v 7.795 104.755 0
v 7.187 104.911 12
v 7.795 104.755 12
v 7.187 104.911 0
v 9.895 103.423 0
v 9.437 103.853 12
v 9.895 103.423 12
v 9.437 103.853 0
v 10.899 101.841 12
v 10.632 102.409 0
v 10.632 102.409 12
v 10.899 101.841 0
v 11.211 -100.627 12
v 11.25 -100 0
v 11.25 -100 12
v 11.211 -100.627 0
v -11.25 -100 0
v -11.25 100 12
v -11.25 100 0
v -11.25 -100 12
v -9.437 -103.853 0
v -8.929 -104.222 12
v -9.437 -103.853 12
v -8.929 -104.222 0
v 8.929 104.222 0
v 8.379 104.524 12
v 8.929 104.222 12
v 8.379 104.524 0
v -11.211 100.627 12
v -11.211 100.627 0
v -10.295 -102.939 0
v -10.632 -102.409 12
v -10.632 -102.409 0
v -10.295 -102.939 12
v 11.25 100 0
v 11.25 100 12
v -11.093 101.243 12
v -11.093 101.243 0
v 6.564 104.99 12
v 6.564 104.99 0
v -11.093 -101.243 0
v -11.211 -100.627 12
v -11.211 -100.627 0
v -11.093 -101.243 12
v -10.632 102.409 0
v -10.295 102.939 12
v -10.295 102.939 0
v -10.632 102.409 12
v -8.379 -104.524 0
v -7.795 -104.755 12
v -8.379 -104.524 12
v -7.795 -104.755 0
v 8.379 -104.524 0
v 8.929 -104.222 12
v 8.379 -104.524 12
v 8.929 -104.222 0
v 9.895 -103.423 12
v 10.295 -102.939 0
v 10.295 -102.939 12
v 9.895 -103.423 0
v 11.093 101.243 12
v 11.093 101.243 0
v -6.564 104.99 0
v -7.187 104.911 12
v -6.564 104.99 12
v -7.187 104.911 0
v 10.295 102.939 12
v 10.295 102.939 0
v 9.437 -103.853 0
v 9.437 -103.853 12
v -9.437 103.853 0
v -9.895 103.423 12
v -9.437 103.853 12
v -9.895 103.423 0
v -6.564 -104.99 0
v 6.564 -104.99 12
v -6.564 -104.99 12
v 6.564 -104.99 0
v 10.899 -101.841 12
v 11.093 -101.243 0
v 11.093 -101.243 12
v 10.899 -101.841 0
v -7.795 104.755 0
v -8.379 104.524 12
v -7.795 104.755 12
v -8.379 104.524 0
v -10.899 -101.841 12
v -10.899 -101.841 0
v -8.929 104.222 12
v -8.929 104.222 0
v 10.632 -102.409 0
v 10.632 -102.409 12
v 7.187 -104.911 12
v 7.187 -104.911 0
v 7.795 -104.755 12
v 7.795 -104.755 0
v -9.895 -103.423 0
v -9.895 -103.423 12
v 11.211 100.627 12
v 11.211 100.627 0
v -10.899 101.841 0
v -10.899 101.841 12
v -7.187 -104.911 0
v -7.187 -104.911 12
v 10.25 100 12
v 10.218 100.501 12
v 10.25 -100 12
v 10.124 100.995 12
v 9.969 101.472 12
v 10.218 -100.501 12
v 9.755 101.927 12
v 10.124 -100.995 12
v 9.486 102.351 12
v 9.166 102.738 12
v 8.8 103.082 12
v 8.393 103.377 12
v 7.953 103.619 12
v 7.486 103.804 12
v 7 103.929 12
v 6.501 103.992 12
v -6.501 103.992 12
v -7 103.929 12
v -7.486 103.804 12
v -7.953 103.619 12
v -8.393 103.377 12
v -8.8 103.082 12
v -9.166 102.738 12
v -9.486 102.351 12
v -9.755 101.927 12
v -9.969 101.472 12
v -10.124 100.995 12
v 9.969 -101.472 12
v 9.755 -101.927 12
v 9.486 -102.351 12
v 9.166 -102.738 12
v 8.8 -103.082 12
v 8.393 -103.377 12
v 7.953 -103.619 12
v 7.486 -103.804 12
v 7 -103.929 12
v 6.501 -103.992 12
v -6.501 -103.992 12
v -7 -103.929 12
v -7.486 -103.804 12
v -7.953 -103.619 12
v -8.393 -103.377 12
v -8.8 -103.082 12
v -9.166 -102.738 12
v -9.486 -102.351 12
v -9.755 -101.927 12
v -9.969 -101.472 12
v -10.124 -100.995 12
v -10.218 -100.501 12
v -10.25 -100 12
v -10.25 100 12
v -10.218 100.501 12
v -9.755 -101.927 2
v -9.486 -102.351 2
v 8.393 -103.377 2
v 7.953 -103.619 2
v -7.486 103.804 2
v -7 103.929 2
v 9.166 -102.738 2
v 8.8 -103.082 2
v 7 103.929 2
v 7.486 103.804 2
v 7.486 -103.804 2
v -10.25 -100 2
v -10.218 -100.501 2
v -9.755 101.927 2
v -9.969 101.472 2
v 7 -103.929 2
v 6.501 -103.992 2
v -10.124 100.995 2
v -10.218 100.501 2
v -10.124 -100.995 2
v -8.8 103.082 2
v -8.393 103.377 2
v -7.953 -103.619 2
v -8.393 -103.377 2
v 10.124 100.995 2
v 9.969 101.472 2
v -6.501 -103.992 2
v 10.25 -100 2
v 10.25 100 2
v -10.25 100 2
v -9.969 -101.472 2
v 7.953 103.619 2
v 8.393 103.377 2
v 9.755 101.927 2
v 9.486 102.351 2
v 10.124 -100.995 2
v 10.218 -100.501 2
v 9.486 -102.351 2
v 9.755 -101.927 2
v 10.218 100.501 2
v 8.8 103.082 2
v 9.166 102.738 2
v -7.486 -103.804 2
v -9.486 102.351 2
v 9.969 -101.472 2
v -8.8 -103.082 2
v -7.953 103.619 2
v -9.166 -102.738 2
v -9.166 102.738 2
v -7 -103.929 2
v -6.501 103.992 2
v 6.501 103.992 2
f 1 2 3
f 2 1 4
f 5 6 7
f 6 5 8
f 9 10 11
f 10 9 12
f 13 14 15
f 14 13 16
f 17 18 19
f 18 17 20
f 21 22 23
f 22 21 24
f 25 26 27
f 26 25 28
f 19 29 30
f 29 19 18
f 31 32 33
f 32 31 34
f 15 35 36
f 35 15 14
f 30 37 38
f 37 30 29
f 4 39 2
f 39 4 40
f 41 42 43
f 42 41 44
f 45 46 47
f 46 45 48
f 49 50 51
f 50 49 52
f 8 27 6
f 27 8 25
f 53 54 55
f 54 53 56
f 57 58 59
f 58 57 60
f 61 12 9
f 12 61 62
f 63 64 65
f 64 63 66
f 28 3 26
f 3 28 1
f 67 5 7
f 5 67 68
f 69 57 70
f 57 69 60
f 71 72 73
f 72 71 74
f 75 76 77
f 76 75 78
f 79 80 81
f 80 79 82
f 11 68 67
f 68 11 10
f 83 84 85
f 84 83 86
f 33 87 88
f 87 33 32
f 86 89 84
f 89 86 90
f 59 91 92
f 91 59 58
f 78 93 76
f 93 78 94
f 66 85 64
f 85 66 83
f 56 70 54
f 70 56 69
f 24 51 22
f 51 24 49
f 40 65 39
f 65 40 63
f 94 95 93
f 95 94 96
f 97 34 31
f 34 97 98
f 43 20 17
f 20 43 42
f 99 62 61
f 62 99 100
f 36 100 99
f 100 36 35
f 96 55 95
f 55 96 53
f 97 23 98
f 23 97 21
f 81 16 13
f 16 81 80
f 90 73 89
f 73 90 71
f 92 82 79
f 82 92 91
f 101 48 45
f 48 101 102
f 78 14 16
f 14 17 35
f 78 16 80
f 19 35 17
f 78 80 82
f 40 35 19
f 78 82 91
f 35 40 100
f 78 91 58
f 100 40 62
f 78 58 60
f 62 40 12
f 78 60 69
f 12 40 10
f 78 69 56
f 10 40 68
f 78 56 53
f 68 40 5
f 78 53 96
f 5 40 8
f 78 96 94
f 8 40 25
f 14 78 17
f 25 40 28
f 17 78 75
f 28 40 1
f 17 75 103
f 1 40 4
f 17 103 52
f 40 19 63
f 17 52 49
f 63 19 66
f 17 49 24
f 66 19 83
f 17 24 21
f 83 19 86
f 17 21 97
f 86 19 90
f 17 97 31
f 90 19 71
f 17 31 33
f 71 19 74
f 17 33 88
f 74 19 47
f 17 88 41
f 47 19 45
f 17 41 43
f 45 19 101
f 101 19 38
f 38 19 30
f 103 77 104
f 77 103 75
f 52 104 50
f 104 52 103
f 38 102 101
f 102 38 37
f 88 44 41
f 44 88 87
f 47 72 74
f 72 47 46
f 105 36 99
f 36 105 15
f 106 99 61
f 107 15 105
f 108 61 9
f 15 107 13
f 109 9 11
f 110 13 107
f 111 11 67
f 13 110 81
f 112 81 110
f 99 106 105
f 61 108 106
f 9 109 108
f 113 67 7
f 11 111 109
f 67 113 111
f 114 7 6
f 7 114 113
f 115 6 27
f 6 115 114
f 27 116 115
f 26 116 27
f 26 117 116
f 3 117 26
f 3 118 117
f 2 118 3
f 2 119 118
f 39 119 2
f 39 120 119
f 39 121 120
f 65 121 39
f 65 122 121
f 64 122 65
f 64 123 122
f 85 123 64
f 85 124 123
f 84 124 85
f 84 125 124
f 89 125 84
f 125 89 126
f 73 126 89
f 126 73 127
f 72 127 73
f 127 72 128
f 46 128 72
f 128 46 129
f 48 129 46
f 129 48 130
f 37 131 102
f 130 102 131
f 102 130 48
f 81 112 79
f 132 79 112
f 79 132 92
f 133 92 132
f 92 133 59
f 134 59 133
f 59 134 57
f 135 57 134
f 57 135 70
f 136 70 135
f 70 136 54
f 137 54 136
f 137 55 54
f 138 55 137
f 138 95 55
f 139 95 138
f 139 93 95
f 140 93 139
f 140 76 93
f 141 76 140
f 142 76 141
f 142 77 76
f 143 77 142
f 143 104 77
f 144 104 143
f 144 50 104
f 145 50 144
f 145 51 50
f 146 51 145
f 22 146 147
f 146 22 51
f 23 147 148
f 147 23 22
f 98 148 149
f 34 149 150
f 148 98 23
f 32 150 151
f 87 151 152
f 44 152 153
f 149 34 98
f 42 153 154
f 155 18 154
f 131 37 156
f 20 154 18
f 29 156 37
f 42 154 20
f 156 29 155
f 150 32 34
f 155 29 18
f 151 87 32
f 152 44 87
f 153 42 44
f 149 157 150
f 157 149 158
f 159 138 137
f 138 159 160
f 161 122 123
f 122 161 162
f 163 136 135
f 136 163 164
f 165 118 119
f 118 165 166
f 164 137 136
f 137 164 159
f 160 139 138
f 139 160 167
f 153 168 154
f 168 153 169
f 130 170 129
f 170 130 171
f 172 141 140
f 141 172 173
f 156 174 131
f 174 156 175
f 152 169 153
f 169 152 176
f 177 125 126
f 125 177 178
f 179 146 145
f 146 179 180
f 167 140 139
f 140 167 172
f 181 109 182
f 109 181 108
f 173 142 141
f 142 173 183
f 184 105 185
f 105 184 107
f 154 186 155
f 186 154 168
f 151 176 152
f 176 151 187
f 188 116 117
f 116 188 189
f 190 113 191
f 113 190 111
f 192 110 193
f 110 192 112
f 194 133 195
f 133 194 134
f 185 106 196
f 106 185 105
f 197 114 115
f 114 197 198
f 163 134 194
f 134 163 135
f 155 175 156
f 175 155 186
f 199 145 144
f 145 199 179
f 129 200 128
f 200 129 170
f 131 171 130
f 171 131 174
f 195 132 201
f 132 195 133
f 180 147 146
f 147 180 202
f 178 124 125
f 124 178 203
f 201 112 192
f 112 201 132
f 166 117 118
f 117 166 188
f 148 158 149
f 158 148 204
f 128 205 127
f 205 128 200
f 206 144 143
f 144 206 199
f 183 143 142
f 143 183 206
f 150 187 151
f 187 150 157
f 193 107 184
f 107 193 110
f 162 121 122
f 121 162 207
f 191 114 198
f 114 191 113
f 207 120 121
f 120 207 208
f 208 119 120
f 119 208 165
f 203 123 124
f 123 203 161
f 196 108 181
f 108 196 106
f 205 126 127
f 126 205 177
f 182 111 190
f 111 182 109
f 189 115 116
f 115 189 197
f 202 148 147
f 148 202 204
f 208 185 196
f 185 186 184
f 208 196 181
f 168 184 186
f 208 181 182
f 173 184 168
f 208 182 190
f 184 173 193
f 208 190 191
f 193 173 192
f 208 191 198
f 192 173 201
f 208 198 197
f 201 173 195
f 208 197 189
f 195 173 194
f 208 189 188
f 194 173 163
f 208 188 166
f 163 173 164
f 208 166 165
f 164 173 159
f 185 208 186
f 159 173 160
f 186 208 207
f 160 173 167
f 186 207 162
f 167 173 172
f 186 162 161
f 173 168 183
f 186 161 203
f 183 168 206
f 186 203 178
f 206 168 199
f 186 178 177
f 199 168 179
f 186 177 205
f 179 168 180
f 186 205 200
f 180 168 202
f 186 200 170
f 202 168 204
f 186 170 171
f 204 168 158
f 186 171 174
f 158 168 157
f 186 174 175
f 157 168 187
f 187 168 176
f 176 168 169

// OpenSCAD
$fn = 50;


difference() {
	union() {
		hull() {
			translate(v = [-6.2500000000, 100.0000000000, 0]) {
				cylinder(h = 12, r = 5);
			}
			translate(v = [6.2500000000, 100.0000000000, 0]) {
				cylinder(h = 12, r = 5);
			}
			translate(v = [-6.2500000000, -100.0000000000, 0]) {
				cylinder(h = 12, r = 5);
			}
			translate(v = [6.2500000000, -100.0000000000, 0]) {
				cylinder(h = 12, r = 5);
			}
		}
	}
	union() {
		translate(v = [0, 0, 2]) {
			hull() {
				translate(v = [-6.2500000000, 100.0000000000, 0]) {
					cylinder(h = 10, r = 4);
				}
				translate(v = [6.2500000000, 100.0000000000, 0]) {
					cylinder(h = 10, r = 4);
				}
				translate(v = [-6.2500000000, -100.0000000000, 0]) {
					cylinder(h = 10, r = 4);
				}
				translate(v = [6.2500000000, -100.0000000000, 0]) {
					cylinder(h = 10, r = 4);
				}
			}
		}
	}
}
